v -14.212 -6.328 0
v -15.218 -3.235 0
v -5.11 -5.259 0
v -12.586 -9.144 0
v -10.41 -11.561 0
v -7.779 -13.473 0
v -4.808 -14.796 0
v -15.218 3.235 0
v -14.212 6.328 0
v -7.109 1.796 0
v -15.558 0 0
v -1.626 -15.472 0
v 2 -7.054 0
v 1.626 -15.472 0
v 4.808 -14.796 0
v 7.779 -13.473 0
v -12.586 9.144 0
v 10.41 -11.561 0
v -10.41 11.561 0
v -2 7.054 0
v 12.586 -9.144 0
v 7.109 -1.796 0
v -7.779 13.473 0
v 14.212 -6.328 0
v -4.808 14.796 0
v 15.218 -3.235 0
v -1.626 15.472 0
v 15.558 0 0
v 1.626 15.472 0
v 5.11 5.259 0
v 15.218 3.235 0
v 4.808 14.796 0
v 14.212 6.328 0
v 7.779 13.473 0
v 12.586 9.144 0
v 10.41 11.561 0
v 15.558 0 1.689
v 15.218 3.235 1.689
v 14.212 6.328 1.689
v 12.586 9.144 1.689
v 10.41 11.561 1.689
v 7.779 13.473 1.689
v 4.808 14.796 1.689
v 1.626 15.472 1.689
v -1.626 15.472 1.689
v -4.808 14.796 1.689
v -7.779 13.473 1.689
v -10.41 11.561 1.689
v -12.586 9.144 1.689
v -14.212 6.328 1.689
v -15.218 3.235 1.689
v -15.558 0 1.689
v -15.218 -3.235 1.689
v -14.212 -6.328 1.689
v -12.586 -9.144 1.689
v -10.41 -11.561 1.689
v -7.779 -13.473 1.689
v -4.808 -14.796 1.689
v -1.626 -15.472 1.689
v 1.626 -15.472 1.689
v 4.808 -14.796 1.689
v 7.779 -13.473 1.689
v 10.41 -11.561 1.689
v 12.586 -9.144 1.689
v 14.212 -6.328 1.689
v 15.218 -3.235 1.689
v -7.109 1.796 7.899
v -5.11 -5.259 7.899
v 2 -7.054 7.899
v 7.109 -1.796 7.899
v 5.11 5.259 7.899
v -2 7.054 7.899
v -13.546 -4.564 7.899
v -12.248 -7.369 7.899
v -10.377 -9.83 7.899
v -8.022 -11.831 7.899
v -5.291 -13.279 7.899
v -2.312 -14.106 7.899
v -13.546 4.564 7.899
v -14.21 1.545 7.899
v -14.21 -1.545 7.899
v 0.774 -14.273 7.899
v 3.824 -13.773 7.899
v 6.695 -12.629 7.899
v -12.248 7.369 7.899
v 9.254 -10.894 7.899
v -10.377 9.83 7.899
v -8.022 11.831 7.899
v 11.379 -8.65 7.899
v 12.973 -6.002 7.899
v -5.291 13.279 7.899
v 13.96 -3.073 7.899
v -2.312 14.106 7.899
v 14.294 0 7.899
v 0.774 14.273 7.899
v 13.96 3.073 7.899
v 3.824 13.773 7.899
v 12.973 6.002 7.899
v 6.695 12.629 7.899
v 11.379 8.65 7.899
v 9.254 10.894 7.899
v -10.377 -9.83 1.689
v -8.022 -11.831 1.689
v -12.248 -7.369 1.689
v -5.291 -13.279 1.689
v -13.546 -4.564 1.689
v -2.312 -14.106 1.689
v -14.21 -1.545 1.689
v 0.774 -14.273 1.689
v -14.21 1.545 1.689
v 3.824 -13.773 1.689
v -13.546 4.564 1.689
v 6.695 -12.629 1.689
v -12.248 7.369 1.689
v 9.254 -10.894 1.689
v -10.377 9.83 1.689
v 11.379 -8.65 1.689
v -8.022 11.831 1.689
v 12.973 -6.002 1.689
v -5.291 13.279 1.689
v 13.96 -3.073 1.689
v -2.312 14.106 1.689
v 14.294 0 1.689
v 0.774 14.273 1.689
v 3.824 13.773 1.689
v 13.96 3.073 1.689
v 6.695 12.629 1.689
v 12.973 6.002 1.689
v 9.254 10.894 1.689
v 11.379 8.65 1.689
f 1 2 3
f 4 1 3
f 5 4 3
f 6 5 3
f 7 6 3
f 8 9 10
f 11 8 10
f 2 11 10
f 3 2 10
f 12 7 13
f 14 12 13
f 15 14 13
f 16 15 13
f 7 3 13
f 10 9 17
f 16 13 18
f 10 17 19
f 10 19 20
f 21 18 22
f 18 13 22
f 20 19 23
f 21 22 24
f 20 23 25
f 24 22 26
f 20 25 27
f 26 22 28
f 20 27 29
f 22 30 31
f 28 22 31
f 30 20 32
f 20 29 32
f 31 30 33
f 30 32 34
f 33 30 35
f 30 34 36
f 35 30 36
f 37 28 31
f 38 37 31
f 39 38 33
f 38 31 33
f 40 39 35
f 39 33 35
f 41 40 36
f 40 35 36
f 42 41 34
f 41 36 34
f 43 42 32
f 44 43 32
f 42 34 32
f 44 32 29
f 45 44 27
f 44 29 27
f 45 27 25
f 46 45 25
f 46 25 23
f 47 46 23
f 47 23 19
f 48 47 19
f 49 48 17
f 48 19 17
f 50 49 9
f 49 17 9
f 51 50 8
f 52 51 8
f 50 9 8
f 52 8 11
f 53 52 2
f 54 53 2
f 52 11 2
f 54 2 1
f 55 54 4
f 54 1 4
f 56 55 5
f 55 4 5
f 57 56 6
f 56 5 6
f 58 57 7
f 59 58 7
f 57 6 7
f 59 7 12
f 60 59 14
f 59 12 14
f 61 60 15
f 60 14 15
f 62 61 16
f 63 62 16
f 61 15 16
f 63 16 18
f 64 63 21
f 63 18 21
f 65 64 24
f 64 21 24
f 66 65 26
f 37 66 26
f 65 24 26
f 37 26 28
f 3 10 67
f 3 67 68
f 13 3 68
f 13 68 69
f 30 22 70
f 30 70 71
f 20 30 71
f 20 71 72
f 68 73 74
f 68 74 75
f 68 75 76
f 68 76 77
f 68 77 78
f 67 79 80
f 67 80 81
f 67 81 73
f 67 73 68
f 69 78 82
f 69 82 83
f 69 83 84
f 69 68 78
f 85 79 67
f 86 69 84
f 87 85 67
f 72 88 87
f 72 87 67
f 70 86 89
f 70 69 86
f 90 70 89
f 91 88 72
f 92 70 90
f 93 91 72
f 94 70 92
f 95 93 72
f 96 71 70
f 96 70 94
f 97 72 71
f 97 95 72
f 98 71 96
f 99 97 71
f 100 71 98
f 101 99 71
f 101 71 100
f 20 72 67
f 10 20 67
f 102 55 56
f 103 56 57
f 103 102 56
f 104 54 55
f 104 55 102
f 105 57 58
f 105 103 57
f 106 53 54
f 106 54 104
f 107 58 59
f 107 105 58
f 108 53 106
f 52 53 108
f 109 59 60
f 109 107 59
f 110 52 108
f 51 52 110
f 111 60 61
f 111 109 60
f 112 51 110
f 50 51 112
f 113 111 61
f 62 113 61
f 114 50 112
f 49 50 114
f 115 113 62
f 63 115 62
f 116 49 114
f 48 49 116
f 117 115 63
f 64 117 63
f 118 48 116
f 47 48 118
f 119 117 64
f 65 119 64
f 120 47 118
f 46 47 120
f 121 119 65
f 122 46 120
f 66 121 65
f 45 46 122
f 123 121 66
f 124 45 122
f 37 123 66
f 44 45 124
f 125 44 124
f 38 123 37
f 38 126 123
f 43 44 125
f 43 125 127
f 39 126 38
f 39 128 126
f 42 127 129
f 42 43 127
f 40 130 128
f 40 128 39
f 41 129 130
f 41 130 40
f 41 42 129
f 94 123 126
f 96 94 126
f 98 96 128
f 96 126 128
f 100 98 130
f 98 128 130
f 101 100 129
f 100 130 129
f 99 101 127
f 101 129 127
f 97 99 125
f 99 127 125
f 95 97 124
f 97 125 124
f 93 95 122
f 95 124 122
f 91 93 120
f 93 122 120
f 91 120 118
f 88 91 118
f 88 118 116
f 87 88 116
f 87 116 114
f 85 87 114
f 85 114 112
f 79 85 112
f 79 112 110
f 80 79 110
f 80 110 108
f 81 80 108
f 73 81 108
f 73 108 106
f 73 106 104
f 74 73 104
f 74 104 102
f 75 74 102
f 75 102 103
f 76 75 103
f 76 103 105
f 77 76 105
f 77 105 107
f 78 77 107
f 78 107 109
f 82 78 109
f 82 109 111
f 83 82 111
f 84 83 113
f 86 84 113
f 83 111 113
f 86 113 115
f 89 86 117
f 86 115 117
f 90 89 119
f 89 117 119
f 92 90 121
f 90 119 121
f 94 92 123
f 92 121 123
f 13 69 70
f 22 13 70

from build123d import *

# Parameters (mm, degrees)
F2_R     = 15.5575
F3_DEPTH = 1.6891
F1_R     = 14.29385
F4_DEPTH = 7.8994
F5_DEPTH = 25.4


with BuildPart() as f3:
    # F2 (on Top) → F3 (new body)
    with BuildSketch(Plane.XY):
        Circle(F2_R)
    extrude(amount=F3_DEPTH)

    # F1 (on Top) → F4 (join)
    with BuildSketch(Plane.XY):
        Circle(F1_R)
    extrude(amount=F4_DEPTH)

    # F0 (on Top) → F5 (cut)
    with BuildSketch(Plane.XY):
        Polygon((1.999529, -7.054447), (7.109095, -1.79558), (5.109565, 5.258866), (-1.999529, 7.054447), (-7.109095, 1.79558), (-5.109565, -5.258866), align=None)
    extrude(amount=F5_DEPTH, mode=Mode.SUBTRACT)


solid = f3.part
